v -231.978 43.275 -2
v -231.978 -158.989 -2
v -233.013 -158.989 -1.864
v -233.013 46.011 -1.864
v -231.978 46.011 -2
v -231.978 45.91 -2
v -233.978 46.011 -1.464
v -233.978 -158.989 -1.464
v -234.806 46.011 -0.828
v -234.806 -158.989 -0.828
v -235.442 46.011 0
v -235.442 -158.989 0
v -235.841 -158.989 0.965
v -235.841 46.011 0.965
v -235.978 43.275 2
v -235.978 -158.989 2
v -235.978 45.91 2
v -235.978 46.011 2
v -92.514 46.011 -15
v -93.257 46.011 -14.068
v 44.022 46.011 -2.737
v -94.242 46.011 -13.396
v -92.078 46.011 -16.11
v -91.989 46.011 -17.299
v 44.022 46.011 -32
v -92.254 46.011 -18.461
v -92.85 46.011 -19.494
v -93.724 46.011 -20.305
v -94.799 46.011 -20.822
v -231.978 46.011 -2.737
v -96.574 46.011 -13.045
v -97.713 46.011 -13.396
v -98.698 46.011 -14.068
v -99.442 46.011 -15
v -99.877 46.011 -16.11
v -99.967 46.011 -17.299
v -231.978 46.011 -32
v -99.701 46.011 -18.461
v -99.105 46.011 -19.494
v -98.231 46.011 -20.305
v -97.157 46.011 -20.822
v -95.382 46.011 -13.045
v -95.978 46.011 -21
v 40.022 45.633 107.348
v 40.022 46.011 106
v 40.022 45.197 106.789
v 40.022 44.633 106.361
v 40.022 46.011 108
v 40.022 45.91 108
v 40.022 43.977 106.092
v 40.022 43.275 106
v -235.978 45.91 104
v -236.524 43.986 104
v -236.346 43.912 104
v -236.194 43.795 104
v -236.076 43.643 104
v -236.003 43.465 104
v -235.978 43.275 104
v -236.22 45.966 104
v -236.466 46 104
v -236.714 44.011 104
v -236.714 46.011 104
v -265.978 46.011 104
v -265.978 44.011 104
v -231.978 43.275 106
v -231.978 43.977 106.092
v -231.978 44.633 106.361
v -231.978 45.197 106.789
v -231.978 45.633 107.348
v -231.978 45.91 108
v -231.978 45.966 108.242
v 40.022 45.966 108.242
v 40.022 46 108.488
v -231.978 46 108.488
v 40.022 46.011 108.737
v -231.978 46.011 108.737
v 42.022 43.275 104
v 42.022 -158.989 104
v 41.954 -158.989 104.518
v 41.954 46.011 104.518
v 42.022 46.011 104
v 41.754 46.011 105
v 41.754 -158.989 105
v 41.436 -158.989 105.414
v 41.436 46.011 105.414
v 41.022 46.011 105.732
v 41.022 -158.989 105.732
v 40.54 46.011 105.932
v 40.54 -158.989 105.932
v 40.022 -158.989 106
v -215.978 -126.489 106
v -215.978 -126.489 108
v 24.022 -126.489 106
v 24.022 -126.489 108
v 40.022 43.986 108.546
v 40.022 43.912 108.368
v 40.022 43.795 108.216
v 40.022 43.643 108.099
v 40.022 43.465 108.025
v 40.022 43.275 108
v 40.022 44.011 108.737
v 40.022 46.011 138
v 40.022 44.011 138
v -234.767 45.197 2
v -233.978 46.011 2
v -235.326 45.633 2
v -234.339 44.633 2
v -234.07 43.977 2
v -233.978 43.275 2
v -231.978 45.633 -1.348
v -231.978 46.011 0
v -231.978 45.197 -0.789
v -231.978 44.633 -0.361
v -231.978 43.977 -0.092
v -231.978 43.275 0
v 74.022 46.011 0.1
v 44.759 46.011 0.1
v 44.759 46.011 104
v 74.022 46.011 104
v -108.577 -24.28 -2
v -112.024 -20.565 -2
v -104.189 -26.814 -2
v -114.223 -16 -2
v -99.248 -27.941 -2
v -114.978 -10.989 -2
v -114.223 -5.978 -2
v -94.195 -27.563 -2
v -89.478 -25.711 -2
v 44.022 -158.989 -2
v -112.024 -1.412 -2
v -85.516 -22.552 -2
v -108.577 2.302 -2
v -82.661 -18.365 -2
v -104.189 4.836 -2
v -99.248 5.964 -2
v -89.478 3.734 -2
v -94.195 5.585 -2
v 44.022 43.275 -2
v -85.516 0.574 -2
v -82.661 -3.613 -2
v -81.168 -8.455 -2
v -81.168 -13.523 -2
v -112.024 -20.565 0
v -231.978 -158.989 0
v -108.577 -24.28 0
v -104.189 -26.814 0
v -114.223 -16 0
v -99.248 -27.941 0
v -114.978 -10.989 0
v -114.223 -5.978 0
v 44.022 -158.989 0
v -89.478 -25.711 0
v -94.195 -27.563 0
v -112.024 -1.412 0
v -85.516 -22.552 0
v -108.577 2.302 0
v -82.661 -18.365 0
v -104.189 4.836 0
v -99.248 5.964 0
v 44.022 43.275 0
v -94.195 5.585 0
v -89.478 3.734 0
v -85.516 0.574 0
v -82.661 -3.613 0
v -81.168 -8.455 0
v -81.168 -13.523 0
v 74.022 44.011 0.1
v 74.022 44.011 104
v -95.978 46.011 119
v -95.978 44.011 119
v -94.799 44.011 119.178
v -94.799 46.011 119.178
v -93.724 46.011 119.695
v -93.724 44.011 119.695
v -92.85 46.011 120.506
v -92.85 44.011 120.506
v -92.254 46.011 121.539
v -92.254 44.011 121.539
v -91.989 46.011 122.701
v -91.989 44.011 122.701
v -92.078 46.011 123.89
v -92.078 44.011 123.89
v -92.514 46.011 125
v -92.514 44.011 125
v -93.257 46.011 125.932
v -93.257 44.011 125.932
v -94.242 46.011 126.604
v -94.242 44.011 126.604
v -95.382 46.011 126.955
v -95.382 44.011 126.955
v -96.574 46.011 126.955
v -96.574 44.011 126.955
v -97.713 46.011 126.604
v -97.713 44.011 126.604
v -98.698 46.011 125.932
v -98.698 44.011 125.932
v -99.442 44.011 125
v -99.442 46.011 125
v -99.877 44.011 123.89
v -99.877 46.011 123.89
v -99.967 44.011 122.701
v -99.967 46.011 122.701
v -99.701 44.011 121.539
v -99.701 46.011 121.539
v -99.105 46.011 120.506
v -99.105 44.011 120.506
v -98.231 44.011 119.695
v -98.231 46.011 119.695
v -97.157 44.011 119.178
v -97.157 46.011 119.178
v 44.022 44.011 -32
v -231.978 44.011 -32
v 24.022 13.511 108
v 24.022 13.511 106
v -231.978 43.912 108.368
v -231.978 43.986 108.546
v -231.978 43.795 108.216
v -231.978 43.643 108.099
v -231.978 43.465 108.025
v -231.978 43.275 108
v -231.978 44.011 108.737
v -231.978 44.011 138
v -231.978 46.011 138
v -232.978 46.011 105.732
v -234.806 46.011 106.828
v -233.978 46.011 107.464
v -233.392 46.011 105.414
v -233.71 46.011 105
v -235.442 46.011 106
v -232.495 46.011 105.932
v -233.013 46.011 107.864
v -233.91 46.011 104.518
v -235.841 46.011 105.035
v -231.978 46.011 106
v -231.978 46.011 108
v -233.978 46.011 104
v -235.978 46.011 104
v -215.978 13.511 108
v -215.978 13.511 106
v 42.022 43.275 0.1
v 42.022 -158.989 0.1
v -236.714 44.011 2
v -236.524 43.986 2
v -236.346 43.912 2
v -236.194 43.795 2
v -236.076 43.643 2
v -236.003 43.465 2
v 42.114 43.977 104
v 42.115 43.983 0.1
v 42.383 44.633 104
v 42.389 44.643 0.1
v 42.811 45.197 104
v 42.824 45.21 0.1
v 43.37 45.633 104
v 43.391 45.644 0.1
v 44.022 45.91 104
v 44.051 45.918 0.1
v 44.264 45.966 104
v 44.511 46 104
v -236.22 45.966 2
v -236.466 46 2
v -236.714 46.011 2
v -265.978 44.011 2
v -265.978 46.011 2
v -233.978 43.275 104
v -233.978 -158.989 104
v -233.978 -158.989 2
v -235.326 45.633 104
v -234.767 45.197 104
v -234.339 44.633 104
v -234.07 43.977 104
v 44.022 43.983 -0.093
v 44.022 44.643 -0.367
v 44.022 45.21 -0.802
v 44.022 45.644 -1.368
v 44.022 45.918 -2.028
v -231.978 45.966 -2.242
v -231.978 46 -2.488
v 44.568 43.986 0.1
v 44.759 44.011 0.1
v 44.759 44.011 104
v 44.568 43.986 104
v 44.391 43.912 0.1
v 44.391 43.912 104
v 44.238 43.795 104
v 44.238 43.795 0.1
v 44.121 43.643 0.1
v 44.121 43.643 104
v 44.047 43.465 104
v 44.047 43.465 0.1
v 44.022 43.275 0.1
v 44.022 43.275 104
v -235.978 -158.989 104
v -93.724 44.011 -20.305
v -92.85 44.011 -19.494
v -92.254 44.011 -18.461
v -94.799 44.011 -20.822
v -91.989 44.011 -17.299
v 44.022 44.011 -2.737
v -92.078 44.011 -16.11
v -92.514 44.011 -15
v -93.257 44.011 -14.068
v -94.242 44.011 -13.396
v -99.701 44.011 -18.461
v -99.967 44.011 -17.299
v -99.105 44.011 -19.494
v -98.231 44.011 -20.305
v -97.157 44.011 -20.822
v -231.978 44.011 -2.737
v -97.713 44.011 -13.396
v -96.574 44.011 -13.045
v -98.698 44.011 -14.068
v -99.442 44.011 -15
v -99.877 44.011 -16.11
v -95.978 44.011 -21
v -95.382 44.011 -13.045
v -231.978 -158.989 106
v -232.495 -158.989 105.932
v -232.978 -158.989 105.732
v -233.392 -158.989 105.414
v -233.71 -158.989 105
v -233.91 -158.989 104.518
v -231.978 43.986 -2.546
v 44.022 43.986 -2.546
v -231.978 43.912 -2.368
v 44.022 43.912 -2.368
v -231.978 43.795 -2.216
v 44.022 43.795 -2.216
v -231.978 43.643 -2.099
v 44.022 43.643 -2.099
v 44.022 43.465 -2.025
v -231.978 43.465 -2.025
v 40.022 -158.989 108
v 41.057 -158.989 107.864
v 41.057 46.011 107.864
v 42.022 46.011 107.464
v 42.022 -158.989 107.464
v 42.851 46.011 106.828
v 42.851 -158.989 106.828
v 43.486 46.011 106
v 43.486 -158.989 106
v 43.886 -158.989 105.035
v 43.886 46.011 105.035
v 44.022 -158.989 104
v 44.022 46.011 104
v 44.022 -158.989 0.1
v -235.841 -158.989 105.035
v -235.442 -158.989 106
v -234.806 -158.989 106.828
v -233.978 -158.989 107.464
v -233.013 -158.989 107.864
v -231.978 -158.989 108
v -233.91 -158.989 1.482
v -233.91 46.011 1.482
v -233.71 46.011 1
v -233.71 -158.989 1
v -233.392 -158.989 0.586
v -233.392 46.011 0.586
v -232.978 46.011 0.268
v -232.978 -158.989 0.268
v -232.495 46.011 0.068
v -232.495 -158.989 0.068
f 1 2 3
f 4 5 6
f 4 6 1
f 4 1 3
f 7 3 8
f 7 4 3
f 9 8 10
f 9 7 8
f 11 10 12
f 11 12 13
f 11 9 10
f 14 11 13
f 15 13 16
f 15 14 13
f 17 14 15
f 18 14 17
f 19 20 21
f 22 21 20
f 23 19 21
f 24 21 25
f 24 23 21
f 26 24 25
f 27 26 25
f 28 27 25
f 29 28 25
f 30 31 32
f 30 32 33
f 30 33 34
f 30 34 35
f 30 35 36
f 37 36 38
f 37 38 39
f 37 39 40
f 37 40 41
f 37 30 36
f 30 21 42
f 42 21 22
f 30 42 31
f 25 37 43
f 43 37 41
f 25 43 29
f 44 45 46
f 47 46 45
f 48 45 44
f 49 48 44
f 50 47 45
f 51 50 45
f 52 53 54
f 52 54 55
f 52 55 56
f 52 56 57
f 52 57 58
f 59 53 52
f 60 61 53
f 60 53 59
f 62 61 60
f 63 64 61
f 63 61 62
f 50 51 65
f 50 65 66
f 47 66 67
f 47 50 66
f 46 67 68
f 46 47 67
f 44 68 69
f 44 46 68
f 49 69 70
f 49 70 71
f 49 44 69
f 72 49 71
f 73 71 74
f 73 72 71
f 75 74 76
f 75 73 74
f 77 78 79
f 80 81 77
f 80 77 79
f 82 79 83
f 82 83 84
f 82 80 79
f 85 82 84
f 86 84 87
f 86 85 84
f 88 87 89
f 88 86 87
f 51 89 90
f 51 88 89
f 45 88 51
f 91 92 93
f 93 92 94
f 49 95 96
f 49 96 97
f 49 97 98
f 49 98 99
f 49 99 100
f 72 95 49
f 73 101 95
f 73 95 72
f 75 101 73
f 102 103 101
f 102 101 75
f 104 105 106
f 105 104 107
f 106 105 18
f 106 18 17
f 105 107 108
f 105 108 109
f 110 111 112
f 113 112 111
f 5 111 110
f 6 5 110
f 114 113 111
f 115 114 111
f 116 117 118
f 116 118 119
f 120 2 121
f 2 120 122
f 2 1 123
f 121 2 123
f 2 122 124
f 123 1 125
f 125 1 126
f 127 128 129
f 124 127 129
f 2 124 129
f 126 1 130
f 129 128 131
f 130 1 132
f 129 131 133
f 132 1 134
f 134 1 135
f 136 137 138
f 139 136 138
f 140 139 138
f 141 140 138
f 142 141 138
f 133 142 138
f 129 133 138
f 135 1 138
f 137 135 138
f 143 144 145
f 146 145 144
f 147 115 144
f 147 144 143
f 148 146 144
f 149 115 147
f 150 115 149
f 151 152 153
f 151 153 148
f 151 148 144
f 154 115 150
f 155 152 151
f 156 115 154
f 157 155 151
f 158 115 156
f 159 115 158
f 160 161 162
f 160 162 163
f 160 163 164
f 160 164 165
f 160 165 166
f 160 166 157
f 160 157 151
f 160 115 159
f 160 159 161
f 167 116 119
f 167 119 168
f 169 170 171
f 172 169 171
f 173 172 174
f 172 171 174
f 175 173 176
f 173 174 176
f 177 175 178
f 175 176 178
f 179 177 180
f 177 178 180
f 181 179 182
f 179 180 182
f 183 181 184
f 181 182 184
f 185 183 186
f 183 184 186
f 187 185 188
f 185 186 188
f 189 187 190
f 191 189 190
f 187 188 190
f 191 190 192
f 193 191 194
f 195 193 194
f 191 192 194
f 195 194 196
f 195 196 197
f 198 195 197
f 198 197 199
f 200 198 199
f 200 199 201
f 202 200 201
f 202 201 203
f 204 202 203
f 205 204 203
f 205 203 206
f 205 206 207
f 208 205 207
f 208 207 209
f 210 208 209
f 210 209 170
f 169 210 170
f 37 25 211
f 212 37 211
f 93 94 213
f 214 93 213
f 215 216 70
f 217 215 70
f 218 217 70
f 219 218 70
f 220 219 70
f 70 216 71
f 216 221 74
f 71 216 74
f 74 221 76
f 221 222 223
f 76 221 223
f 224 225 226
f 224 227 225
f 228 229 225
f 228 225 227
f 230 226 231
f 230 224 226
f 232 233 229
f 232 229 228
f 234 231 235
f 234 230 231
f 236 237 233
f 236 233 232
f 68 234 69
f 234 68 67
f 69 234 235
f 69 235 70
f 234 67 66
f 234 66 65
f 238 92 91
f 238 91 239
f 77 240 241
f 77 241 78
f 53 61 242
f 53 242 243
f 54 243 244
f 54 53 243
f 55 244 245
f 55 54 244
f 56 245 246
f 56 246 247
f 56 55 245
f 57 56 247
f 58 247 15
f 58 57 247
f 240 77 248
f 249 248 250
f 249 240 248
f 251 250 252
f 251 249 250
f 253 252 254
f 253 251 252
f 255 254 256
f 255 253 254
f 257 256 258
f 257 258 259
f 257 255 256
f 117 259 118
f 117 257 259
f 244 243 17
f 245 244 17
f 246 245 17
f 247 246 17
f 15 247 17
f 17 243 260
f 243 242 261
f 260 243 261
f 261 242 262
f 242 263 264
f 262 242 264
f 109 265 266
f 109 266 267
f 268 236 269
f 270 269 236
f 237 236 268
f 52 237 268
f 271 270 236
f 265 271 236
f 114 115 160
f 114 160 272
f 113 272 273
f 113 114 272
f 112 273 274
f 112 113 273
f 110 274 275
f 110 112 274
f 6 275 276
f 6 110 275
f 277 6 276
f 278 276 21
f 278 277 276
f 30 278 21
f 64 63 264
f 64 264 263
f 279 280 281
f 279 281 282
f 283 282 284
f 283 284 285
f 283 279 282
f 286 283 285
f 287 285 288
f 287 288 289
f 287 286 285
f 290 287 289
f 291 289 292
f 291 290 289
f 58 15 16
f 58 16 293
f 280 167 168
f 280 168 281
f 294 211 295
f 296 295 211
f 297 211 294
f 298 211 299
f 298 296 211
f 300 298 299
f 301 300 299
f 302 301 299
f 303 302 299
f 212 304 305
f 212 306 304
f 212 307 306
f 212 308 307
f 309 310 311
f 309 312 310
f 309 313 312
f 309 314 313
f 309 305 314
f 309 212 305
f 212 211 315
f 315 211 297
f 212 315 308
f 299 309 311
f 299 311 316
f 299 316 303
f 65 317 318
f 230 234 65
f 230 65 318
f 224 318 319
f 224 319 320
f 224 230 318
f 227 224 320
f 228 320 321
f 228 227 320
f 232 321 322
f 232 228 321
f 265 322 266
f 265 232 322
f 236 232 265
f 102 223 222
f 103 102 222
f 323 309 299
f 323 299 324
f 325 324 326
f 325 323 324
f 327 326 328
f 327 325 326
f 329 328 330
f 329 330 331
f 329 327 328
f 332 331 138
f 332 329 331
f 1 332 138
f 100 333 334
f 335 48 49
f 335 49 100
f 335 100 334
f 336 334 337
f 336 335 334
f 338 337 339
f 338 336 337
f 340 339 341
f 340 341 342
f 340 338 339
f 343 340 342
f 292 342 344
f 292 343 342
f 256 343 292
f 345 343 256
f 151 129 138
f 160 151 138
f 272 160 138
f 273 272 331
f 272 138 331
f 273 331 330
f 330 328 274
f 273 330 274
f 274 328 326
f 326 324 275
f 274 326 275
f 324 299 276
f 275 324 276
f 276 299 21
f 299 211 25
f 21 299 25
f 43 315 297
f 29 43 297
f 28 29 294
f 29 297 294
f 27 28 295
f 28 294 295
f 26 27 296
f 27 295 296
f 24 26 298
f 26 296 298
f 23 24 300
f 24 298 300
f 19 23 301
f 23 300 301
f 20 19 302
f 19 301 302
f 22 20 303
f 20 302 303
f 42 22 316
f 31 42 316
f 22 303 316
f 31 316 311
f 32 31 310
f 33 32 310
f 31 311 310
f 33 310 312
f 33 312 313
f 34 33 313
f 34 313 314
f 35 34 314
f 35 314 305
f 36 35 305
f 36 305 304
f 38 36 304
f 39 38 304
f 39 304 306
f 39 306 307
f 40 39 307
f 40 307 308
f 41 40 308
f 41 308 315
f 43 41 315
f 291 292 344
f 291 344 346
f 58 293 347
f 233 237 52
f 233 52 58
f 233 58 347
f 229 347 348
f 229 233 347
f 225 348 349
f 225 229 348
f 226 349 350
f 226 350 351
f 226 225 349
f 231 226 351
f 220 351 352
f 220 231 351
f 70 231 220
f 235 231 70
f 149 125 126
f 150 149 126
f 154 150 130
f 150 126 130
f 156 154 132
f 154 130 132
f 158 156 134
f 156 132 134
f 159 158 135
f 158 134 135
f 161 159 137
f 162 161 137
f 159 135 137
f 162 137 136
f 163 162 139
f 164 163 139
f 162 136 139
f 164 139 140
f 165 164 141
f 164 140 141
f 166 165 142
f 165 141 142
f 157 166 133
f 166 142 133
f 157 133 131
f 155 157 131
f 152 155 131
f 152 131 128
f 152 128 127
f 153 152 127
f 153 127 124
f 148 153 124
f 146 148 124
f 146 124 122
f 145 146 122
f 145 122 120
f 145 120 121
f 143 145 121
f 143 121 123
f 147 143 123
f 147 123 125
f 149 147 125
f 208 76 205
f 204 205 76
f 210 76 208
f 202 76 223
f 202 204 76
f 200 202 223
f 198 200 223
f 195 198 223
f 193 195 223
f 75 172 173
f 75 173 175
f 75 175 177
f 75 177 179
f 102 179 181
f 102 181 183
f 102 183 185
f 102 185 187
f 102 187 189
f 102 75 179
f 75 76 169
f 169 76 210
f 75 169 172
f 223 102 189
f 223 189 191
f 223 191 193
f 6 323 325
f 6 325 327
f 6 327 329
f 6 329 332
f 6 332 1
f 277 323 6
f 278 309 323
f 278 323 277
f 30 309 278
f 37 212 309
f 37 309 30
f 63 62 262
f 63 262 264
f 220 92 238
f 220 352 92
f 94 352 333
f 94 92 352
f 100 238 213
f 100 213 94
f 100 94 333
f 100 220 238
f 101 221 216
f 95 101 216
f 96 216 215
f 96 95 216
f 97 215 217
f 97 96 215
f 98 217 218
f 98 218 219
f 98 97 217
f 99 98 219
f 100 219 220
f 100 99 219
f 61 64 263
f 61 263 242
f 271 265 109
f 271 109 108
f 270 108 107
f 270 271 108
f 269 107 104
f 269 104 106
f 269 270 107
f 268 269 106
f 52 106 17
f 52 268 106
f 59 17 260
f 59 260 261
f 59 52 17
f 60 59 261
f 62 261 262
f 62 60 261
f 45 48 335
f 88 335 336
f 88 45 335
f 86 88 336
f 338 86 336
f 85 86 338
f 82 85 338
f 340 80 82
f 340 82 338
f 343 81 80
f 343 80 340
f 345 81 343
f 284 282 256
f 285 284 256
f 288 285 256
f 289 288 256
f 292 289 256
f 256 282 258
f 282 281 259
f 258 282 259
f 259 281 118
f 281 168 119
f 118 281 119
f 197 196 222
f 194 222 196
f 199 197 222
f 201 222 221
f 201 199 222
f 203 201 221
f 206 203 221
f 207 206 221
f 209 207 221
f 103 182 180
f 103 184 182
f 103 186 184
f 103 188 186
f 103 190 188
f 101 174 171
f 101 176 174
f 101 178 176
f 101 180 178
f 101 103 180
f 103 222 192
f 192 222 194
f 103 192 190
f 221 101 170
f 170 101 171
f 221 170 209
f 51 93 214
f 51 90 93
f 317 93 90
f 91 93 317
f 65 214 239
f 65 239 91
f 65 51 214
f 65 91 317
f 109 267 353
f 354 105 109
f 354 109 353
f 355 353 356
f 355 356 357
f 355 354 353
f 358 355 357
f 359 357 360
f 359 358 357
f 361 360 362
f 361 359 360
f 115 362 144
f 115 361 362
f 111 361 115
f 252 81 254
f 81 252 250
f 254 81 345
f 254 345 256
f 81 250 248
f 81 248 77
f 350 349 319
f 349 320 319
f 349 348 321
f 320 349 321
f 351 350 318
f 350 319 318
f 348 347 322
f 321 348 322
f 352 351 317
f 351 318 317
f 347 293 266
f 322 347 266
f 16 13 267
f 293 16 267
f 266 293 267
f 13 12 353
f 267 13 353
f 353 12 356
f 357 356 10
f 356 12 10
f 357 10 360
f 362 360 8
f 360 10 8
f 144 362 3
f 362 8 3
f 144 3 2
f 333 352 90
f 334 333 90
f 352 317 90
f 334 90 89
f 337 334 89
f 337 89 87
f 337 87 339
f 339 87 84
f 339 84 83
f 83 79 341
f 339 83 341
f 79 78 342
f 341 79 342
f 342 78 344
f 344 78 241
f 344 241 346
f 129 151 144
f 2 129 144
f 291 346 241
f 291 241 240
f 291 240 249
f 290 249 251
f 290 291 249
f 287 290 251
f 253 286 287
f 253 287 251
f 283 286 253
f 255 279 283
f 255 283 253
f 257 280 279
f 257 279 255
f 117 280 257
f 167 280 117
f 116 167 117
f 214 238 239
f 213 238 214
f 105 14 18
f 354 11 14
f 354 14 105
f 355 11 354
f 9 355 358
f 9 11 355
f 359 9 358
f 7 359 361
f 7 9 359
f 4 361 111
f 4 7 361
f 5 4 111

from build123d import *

# Parameters (mm, degrees)
SKETCH1_W                       = 280
SKETCH1_H                       = 205
BASE_FLANGE1_DEPTH              = 2
EDGE_FLANGE1_STRIP_W            = 12
EDGE_FLANGE1_STRIP_H            = 2
EDGE_FLANGE1_STRIP_CUT_DEPTH    = 205
EDGE_FLANGE1_DEPTH              = 205
EDGE_FLANGE2_STRIP_W            = 12
EDGE_FLANGE2_STRIP_H            = 2
EDGE_FLANGE2_STRIP_CUT_DEPTH    = 205
EDGE_FLANGE2_DEPTH              = 205
EDGE_FLANGE3_STRIP_W            = 12
EDGE_FLANGE3_STRIP_H            = 2
EDGE_FLANGE3_STRIP_CUT_DEPTH    = 205
EDGE_FLANGE3_DEPTH              = 205
SKETCH15_W                      = 240
SKETCH15_H                      = 140
CUT_EXTRUDE1_DEPTH              = 10
SKETCH16_R                      = 17
CUT_EXTRUDE2_DEPTH              = 10
EDGE_FLANGE11_STRIP_W           = 9.4732
EDGE_FLANGE11_STRIP_H           = 2
EDGE_FLANGE11_STRIP_CUT_DEPTH   = 276
EDGE_FLANGE11_STRIP_2_W         = 9.4732
EDGE_FLANGE11_STRIP_2_H         = 2
EDGE_FLANGE11_STRIP_CUT_2_DEPTH = 102
EDGE_FLANGE11_STRIP_3_W         = 9.4732
EDGE_FLANGE11_STRIP_3_H         = 2
EDGE_FLANGE11_STRIP_CUT_3_DEPTH = 272
EDGE_FLANGE11_STRIP_4_W         = 9.4732
EDGE_FLANGE11_STRIP_4_H         = 2
EDGE_FLANGE11_STRIP_CUT_4_DEPTH = 103.9
EDGE_FLANGE11_DEPTH             = 276
EDGE_FLANGE11_BEND_DEPTH        = 102
EDGE_FLANGE11_BEND_2_DEPTH      = 272
EDGE_FLANGE11_BEND_3_DEPTH      = 103.9
SKETCH55_R                      = 4
CUT_EXTRUDE3_DEPTH              = 10


# Sheet-metal steps are written as plain solids
with BuildPart() as part:
    # Sketch1 → Base-Flange1 (new body)
    with BuildSketch(Plane.XY):
        with Locations((-95.977777778, -56.488888889)):
            Rectangle(SKETCH1_W, SKETCH1_H)
    extrude(amount=-BASE_FLANGE1_DEPTH)

    # Edge-Flange1 strip (across the edge) → Edge-Flange1 strip cut (cut)
    with BuildSketch(Plane(origin=(-235.977777778, 46.011111111, 0), x_dir=(1, 0, 0), z_dir=(0, -1, 0))):
        with Locations((-2, -1)):
            Rectangle(EDGE_FLANGE1_STRIP_W, EDGE_FLANGE1_STRIP_H)
    extrude(amount=EDGE_FLANGE1_STRIP_CUT_DEPTH, mode=Mode.SUBTRACT)

    # Edge-Flange1 section (across the edge) → Edge-Flange1 (add)
    with BuildSketch(Plane(origin=(-235.977777778, 46.011111111, 0), x_dir=(1, 0, 0), z_dir=(0, -1, 0))):
        with BuildLine():
            Line((0, 2), (0, 108))
            Line((0, 108), (2, 108))
            Line((2, 108), (2, 2))
            ThreePointArc((2, 2), (2.585786438, 0.585786438), (4, 0))
            Line((4, 0), (4, -2))
            ThreePointArc((4, -2), (1.171572875, -0.828427125), (0, 2))
        make_face()
    extrude(amount=EDGE_FLANGE1_DEPTH)

    # Edge-Flange2 strip (across the edge) → Edge-Flange2 strip cut (cut)
    with BuildSketch(Plane(origin=(-233.977777778, 46.011111111, 108), x_dir=(0, 0, -1), z_dir=(0, -1, 0))):
        with Locations((-2, -1)):
            Rectangle(EDGE_FLANGE2_STRIP_W, EDGE_FLANGE2_STRIP_H)
    extrude(amount=EDGE_FLANGE2_STRIP_CUT_DEPTH, mode=Mode.SUBTRACT)

    # Edge-Flange2 section (across the edge) → Edge-Flange2 (add)
    with BuildSketch(Plane(origin=(-233.977777778, 46.011111111, 108), x_dir=(0, 0, -1), z_dir=(0, -1, 0))):
        with BuildLine():
            Line((0, 2), (0, 278))
            Line((0, 278), (2, 278))
            Line((2, 278), (2, 2))
            ThreePointArc((2, 2), (2.585786438, 0.585786438), (4, 0))
            Line((4, 0), (4, -2))
            ThreePointArc((4, -2), (1.171572875, -0.828427125), (0, 2))
        make_face()
    extrude(amount=EDGE_FLANGE2_DEPTH)

    # Edge-Flange3 strip (across the edge) → Edge-Flange3 strip cut (cut)
    with BuildSketch(Plane(origin=(44.022222222, 46.011111111, 106), x_dir=(-1, 0, 0), z_dir=(0, -1, 0))):
        with Locations((-2, -1)):
            Rectangle(EDGE_FLANGE3_STRIP_W, EDGE_FLANGE3_STRIP_H)
    extrude(amount=EDGE_FLANGE3_STRIP_CUT_DEPTH, mode=Mode.SUBTRACT)

    # Edge-Flange3 section (across the edge) → Edge-Flange3 (add)
    with BuildSketch(Plane(origin=(44.022222222, 46.011111111, 106), x_dir=(-1, 0, 0), z_dir=(0, -1, 0))):
        with BuildLine():
            Line((0, 2), (0, 105.9))
            Line((0, 105.9), (2, 105.9))
            Line((2, 105.9), (2, 2))
            ThreePointArc((2, 2), (2.585786438, 0.585786438), (4, 0))
            Line((4, 0), (4, -2))
            ThreePointArc((4, -2), (1.171572875, -0.828427125), (0, 2))
        make_face()
    extrude(amount=EDGE_FLANGE3_DEPTH)

    # Sketch15 → Cut-Extrude1 (cut)
    with BuildSketch(Plane.XY.offset(108)):
        with Locations((-95.977777778, -56.488888889)):
            Rectangle(SKETCH15_W, SKETCH15_H)
    extrude(amount=-CUT_EXTRUDE1_DEPTH, mode=Mode.SUBTRACT)

    # Sketch16 → Cut-Extrude2 (cut)
    with BuildSketch(Plane(origin=(0, 0, -2), x_dir=(-1, 0, 0), z_dir=(0, 0, -1))):
        with Locations((97.977777778, -10.988888889)):
            Circle(SKETCH16_R)
    extrude(amount=-CUT_EXTRUDE2_DEPTH, mode=Mode.SUBTRACT)

    # Edge-Flange11 strip (across the edge) → Edge-Flange11 strip cut (cut)
    with BuildSketch(Plane(origin=(-231.977777778, 46.011111111, -2), x_dir=(0, -1, 0), z_dir=(1, 0, 0))):
        with Locations((-2, -1)):
            Rectangle(EDGE_FLANGE11_STRIP_W, EDGE_FLANGE11_STRIP_H)
    extrude(amount=EDGE_FLANGE11_STRIP_CUT_DEPTH, mode=Mode.SUBTRACT)

    # Edge-Flange11 strip 2 (across the edge) → Edge-Flange11 strip cut 2 (cut)
    with BuildSketch(Plane(origin=(-235.977777778, 46.011111111, 104), x_dir=(0, -1, 0), z_dir=(0, 0, -1))):
        with Locations((-2, -1)):
            Rectangle(EDGE_FLANGE11_STRIP_2_W, EDGE_FLANGE11_STRIP_2_H)
    extrude(amount=EDGE_FLANGE11_STRIP_CUT_2_DEPTH, mode=Mode.SUBTRACT)

    # Edge-Flange11 strip 3 (across the edge) → Edge-Flange11 strip cut 3 (cut)
    with BuildSketch(Plane(origin=(40.022222222, 46.011111111, 108), x_dir=(0, -1, 0), z_dir=(-1, 0, 0))):
        with Locations((-2, -1)):
            Rectangle(EDGE_FLANGE11_STRIP_3_W, EDGE_FLANGE11_STRIP_3_H)
    extrude(amount=EDGE_FLANGE11_STRIP_CUT_3_DEPTH, mode=Mode.SUBTRACT)

    # Edge-Flange11 strip 4 (across the edge) → Edge-Flange11 strip cut 4 (cut)
    with BuildSketch(Plane(origin=(44.022222222, 46.011111111, 0.1), x_dir=(0, -1, 0), z_dir=(0, 0, 1))):
        with Locations((-2, -1)):
            Rectangle(EDGE_FLANGE11_STRIP_4_W, EDGE_FLANGE11_STRIP_4_H)
    extrude(amount=EDGE_FLANGE11_STRIP_CUT_4_DEPTH, mode=Mode.SUBTRACT)

    # Edge-Flange11 section (across the edge) → Edge-Flange11 (add)
    with BuildSketch(Plane(origin=(-231.977777778, 46.011111111, -2), x_dir=(0, -1, 0), z_dir=(1, 0, 0))):
        with BuildLine():
            Line((0, 0.7366), (0, 30))
            Line((0, 30), (2, 30))
            Line((2, 30), (2, 0.7366))
            ThreePointArc((2, 0.7366), (2.215745145, 0.215745145), (2.7366, 0))
            Line((2.7366, 0), (2.7366, -2))
            ThreePointArc((2.7366, -2), (0.801531583, -1.198468417), (0, 0.7366))
        make_face()
    extrude(amount=EDGE_FLANGE11_DEPTH)

    # Edge-Flange11 section 2 (across the edge) → Edge-Flange11 bend (add)
    with BuildSketch(Plane(origin=(-235.977777778, 46.011111111, 104), x_dir=(0, -1, 0), z_dir=(0, 0, -1))):
        with BuildLine():
            Line((0, 0.7366), (0, 30))
            Line((0, 30), (2, 30))
            Line((2, 30), (2, 0.7366))
            ThreePointArc((2, 0.7366), (2.215745145, 0.215745145), (2.7366, 0))
            Line((2.7366, 0), (2.7366, -2))
            ThreePointArc((2.7366, -2), (0.801531583, -1.198468417), (0, 0.7366))
        make_face()
    extrude(amount=EDGE_FLANGE11_BEND_DEPTH)

    # Edge-Flange11 section 3 (across the edge) → Edge-Flange11 bend 2 (add)
    with BuildSketch(Plane(origin=(40.022222222, 46.011111111, 108), x_dir=(0, -1, 0), z_dir=(-1, 0, 0))):
        with BuildLine():
            Line((0, 0.7366), (0, 30))
            Line((0, 30), (2, 30))
            Line((2, 30), (2, 0.7366))
            ThreePointArc((2, 0.7366), (2.215745145, 0.215745145), (2.7366, 0))
            Line((2.7366, 0), (2.7366, -2))
            ThreePointArc((2.7366, -2), (0.801531583, -1.198468417), (0, 0.7366))
        make_face()
    extrude(amount=EDGE_FLANGE11_BEND_2_DEPTH)

    # Edge-Flange11 section 4 (across the edge) → Edge-Flange11 bend 3 (add)
    with BuildSketch(Plane(origin=(44.022222222, 46.011111111, 0.1), x_dir=(0, -1, 0), z_dir=(0, 0, 1))):
        with BuildLine():
            Line((0, 0.7366), (0, 30))
            Line((0, 30), (2, 30))
            Line((2, 30), (2, 0.7366))
            ThreePointArc((2, 0.7366), (2.215745145, 0.215745145), (2.7366, 0))
            Line((2.7366, 0), (2.7366, -2))
            ThreePointArc((2.7366, -2), (0.801531583, -1.198468417), (0, 0.7366))
        make_face()
    extrude(amount=EDGE_FLANGE11_BEND_3_DEPTH)

    # Sketch55 → Cut-Extrude3 (cut)
    with BuildSketch(Plane.XZ.offset(-44.011111111)):
        with Locations(Location((-95.977777778, -17, 0), (0, 0, 270))):
            Circle(SKETCH55_R)
        with Locations(Location((-95.977777778, 123, 0), (0, 0, 270))):
            Circle(SKETCH55_R)
    extrude(amount=-CUT_EXTRUDE3_DEPTH, mode=Mode.SUBTRACT)


solid = part.part
